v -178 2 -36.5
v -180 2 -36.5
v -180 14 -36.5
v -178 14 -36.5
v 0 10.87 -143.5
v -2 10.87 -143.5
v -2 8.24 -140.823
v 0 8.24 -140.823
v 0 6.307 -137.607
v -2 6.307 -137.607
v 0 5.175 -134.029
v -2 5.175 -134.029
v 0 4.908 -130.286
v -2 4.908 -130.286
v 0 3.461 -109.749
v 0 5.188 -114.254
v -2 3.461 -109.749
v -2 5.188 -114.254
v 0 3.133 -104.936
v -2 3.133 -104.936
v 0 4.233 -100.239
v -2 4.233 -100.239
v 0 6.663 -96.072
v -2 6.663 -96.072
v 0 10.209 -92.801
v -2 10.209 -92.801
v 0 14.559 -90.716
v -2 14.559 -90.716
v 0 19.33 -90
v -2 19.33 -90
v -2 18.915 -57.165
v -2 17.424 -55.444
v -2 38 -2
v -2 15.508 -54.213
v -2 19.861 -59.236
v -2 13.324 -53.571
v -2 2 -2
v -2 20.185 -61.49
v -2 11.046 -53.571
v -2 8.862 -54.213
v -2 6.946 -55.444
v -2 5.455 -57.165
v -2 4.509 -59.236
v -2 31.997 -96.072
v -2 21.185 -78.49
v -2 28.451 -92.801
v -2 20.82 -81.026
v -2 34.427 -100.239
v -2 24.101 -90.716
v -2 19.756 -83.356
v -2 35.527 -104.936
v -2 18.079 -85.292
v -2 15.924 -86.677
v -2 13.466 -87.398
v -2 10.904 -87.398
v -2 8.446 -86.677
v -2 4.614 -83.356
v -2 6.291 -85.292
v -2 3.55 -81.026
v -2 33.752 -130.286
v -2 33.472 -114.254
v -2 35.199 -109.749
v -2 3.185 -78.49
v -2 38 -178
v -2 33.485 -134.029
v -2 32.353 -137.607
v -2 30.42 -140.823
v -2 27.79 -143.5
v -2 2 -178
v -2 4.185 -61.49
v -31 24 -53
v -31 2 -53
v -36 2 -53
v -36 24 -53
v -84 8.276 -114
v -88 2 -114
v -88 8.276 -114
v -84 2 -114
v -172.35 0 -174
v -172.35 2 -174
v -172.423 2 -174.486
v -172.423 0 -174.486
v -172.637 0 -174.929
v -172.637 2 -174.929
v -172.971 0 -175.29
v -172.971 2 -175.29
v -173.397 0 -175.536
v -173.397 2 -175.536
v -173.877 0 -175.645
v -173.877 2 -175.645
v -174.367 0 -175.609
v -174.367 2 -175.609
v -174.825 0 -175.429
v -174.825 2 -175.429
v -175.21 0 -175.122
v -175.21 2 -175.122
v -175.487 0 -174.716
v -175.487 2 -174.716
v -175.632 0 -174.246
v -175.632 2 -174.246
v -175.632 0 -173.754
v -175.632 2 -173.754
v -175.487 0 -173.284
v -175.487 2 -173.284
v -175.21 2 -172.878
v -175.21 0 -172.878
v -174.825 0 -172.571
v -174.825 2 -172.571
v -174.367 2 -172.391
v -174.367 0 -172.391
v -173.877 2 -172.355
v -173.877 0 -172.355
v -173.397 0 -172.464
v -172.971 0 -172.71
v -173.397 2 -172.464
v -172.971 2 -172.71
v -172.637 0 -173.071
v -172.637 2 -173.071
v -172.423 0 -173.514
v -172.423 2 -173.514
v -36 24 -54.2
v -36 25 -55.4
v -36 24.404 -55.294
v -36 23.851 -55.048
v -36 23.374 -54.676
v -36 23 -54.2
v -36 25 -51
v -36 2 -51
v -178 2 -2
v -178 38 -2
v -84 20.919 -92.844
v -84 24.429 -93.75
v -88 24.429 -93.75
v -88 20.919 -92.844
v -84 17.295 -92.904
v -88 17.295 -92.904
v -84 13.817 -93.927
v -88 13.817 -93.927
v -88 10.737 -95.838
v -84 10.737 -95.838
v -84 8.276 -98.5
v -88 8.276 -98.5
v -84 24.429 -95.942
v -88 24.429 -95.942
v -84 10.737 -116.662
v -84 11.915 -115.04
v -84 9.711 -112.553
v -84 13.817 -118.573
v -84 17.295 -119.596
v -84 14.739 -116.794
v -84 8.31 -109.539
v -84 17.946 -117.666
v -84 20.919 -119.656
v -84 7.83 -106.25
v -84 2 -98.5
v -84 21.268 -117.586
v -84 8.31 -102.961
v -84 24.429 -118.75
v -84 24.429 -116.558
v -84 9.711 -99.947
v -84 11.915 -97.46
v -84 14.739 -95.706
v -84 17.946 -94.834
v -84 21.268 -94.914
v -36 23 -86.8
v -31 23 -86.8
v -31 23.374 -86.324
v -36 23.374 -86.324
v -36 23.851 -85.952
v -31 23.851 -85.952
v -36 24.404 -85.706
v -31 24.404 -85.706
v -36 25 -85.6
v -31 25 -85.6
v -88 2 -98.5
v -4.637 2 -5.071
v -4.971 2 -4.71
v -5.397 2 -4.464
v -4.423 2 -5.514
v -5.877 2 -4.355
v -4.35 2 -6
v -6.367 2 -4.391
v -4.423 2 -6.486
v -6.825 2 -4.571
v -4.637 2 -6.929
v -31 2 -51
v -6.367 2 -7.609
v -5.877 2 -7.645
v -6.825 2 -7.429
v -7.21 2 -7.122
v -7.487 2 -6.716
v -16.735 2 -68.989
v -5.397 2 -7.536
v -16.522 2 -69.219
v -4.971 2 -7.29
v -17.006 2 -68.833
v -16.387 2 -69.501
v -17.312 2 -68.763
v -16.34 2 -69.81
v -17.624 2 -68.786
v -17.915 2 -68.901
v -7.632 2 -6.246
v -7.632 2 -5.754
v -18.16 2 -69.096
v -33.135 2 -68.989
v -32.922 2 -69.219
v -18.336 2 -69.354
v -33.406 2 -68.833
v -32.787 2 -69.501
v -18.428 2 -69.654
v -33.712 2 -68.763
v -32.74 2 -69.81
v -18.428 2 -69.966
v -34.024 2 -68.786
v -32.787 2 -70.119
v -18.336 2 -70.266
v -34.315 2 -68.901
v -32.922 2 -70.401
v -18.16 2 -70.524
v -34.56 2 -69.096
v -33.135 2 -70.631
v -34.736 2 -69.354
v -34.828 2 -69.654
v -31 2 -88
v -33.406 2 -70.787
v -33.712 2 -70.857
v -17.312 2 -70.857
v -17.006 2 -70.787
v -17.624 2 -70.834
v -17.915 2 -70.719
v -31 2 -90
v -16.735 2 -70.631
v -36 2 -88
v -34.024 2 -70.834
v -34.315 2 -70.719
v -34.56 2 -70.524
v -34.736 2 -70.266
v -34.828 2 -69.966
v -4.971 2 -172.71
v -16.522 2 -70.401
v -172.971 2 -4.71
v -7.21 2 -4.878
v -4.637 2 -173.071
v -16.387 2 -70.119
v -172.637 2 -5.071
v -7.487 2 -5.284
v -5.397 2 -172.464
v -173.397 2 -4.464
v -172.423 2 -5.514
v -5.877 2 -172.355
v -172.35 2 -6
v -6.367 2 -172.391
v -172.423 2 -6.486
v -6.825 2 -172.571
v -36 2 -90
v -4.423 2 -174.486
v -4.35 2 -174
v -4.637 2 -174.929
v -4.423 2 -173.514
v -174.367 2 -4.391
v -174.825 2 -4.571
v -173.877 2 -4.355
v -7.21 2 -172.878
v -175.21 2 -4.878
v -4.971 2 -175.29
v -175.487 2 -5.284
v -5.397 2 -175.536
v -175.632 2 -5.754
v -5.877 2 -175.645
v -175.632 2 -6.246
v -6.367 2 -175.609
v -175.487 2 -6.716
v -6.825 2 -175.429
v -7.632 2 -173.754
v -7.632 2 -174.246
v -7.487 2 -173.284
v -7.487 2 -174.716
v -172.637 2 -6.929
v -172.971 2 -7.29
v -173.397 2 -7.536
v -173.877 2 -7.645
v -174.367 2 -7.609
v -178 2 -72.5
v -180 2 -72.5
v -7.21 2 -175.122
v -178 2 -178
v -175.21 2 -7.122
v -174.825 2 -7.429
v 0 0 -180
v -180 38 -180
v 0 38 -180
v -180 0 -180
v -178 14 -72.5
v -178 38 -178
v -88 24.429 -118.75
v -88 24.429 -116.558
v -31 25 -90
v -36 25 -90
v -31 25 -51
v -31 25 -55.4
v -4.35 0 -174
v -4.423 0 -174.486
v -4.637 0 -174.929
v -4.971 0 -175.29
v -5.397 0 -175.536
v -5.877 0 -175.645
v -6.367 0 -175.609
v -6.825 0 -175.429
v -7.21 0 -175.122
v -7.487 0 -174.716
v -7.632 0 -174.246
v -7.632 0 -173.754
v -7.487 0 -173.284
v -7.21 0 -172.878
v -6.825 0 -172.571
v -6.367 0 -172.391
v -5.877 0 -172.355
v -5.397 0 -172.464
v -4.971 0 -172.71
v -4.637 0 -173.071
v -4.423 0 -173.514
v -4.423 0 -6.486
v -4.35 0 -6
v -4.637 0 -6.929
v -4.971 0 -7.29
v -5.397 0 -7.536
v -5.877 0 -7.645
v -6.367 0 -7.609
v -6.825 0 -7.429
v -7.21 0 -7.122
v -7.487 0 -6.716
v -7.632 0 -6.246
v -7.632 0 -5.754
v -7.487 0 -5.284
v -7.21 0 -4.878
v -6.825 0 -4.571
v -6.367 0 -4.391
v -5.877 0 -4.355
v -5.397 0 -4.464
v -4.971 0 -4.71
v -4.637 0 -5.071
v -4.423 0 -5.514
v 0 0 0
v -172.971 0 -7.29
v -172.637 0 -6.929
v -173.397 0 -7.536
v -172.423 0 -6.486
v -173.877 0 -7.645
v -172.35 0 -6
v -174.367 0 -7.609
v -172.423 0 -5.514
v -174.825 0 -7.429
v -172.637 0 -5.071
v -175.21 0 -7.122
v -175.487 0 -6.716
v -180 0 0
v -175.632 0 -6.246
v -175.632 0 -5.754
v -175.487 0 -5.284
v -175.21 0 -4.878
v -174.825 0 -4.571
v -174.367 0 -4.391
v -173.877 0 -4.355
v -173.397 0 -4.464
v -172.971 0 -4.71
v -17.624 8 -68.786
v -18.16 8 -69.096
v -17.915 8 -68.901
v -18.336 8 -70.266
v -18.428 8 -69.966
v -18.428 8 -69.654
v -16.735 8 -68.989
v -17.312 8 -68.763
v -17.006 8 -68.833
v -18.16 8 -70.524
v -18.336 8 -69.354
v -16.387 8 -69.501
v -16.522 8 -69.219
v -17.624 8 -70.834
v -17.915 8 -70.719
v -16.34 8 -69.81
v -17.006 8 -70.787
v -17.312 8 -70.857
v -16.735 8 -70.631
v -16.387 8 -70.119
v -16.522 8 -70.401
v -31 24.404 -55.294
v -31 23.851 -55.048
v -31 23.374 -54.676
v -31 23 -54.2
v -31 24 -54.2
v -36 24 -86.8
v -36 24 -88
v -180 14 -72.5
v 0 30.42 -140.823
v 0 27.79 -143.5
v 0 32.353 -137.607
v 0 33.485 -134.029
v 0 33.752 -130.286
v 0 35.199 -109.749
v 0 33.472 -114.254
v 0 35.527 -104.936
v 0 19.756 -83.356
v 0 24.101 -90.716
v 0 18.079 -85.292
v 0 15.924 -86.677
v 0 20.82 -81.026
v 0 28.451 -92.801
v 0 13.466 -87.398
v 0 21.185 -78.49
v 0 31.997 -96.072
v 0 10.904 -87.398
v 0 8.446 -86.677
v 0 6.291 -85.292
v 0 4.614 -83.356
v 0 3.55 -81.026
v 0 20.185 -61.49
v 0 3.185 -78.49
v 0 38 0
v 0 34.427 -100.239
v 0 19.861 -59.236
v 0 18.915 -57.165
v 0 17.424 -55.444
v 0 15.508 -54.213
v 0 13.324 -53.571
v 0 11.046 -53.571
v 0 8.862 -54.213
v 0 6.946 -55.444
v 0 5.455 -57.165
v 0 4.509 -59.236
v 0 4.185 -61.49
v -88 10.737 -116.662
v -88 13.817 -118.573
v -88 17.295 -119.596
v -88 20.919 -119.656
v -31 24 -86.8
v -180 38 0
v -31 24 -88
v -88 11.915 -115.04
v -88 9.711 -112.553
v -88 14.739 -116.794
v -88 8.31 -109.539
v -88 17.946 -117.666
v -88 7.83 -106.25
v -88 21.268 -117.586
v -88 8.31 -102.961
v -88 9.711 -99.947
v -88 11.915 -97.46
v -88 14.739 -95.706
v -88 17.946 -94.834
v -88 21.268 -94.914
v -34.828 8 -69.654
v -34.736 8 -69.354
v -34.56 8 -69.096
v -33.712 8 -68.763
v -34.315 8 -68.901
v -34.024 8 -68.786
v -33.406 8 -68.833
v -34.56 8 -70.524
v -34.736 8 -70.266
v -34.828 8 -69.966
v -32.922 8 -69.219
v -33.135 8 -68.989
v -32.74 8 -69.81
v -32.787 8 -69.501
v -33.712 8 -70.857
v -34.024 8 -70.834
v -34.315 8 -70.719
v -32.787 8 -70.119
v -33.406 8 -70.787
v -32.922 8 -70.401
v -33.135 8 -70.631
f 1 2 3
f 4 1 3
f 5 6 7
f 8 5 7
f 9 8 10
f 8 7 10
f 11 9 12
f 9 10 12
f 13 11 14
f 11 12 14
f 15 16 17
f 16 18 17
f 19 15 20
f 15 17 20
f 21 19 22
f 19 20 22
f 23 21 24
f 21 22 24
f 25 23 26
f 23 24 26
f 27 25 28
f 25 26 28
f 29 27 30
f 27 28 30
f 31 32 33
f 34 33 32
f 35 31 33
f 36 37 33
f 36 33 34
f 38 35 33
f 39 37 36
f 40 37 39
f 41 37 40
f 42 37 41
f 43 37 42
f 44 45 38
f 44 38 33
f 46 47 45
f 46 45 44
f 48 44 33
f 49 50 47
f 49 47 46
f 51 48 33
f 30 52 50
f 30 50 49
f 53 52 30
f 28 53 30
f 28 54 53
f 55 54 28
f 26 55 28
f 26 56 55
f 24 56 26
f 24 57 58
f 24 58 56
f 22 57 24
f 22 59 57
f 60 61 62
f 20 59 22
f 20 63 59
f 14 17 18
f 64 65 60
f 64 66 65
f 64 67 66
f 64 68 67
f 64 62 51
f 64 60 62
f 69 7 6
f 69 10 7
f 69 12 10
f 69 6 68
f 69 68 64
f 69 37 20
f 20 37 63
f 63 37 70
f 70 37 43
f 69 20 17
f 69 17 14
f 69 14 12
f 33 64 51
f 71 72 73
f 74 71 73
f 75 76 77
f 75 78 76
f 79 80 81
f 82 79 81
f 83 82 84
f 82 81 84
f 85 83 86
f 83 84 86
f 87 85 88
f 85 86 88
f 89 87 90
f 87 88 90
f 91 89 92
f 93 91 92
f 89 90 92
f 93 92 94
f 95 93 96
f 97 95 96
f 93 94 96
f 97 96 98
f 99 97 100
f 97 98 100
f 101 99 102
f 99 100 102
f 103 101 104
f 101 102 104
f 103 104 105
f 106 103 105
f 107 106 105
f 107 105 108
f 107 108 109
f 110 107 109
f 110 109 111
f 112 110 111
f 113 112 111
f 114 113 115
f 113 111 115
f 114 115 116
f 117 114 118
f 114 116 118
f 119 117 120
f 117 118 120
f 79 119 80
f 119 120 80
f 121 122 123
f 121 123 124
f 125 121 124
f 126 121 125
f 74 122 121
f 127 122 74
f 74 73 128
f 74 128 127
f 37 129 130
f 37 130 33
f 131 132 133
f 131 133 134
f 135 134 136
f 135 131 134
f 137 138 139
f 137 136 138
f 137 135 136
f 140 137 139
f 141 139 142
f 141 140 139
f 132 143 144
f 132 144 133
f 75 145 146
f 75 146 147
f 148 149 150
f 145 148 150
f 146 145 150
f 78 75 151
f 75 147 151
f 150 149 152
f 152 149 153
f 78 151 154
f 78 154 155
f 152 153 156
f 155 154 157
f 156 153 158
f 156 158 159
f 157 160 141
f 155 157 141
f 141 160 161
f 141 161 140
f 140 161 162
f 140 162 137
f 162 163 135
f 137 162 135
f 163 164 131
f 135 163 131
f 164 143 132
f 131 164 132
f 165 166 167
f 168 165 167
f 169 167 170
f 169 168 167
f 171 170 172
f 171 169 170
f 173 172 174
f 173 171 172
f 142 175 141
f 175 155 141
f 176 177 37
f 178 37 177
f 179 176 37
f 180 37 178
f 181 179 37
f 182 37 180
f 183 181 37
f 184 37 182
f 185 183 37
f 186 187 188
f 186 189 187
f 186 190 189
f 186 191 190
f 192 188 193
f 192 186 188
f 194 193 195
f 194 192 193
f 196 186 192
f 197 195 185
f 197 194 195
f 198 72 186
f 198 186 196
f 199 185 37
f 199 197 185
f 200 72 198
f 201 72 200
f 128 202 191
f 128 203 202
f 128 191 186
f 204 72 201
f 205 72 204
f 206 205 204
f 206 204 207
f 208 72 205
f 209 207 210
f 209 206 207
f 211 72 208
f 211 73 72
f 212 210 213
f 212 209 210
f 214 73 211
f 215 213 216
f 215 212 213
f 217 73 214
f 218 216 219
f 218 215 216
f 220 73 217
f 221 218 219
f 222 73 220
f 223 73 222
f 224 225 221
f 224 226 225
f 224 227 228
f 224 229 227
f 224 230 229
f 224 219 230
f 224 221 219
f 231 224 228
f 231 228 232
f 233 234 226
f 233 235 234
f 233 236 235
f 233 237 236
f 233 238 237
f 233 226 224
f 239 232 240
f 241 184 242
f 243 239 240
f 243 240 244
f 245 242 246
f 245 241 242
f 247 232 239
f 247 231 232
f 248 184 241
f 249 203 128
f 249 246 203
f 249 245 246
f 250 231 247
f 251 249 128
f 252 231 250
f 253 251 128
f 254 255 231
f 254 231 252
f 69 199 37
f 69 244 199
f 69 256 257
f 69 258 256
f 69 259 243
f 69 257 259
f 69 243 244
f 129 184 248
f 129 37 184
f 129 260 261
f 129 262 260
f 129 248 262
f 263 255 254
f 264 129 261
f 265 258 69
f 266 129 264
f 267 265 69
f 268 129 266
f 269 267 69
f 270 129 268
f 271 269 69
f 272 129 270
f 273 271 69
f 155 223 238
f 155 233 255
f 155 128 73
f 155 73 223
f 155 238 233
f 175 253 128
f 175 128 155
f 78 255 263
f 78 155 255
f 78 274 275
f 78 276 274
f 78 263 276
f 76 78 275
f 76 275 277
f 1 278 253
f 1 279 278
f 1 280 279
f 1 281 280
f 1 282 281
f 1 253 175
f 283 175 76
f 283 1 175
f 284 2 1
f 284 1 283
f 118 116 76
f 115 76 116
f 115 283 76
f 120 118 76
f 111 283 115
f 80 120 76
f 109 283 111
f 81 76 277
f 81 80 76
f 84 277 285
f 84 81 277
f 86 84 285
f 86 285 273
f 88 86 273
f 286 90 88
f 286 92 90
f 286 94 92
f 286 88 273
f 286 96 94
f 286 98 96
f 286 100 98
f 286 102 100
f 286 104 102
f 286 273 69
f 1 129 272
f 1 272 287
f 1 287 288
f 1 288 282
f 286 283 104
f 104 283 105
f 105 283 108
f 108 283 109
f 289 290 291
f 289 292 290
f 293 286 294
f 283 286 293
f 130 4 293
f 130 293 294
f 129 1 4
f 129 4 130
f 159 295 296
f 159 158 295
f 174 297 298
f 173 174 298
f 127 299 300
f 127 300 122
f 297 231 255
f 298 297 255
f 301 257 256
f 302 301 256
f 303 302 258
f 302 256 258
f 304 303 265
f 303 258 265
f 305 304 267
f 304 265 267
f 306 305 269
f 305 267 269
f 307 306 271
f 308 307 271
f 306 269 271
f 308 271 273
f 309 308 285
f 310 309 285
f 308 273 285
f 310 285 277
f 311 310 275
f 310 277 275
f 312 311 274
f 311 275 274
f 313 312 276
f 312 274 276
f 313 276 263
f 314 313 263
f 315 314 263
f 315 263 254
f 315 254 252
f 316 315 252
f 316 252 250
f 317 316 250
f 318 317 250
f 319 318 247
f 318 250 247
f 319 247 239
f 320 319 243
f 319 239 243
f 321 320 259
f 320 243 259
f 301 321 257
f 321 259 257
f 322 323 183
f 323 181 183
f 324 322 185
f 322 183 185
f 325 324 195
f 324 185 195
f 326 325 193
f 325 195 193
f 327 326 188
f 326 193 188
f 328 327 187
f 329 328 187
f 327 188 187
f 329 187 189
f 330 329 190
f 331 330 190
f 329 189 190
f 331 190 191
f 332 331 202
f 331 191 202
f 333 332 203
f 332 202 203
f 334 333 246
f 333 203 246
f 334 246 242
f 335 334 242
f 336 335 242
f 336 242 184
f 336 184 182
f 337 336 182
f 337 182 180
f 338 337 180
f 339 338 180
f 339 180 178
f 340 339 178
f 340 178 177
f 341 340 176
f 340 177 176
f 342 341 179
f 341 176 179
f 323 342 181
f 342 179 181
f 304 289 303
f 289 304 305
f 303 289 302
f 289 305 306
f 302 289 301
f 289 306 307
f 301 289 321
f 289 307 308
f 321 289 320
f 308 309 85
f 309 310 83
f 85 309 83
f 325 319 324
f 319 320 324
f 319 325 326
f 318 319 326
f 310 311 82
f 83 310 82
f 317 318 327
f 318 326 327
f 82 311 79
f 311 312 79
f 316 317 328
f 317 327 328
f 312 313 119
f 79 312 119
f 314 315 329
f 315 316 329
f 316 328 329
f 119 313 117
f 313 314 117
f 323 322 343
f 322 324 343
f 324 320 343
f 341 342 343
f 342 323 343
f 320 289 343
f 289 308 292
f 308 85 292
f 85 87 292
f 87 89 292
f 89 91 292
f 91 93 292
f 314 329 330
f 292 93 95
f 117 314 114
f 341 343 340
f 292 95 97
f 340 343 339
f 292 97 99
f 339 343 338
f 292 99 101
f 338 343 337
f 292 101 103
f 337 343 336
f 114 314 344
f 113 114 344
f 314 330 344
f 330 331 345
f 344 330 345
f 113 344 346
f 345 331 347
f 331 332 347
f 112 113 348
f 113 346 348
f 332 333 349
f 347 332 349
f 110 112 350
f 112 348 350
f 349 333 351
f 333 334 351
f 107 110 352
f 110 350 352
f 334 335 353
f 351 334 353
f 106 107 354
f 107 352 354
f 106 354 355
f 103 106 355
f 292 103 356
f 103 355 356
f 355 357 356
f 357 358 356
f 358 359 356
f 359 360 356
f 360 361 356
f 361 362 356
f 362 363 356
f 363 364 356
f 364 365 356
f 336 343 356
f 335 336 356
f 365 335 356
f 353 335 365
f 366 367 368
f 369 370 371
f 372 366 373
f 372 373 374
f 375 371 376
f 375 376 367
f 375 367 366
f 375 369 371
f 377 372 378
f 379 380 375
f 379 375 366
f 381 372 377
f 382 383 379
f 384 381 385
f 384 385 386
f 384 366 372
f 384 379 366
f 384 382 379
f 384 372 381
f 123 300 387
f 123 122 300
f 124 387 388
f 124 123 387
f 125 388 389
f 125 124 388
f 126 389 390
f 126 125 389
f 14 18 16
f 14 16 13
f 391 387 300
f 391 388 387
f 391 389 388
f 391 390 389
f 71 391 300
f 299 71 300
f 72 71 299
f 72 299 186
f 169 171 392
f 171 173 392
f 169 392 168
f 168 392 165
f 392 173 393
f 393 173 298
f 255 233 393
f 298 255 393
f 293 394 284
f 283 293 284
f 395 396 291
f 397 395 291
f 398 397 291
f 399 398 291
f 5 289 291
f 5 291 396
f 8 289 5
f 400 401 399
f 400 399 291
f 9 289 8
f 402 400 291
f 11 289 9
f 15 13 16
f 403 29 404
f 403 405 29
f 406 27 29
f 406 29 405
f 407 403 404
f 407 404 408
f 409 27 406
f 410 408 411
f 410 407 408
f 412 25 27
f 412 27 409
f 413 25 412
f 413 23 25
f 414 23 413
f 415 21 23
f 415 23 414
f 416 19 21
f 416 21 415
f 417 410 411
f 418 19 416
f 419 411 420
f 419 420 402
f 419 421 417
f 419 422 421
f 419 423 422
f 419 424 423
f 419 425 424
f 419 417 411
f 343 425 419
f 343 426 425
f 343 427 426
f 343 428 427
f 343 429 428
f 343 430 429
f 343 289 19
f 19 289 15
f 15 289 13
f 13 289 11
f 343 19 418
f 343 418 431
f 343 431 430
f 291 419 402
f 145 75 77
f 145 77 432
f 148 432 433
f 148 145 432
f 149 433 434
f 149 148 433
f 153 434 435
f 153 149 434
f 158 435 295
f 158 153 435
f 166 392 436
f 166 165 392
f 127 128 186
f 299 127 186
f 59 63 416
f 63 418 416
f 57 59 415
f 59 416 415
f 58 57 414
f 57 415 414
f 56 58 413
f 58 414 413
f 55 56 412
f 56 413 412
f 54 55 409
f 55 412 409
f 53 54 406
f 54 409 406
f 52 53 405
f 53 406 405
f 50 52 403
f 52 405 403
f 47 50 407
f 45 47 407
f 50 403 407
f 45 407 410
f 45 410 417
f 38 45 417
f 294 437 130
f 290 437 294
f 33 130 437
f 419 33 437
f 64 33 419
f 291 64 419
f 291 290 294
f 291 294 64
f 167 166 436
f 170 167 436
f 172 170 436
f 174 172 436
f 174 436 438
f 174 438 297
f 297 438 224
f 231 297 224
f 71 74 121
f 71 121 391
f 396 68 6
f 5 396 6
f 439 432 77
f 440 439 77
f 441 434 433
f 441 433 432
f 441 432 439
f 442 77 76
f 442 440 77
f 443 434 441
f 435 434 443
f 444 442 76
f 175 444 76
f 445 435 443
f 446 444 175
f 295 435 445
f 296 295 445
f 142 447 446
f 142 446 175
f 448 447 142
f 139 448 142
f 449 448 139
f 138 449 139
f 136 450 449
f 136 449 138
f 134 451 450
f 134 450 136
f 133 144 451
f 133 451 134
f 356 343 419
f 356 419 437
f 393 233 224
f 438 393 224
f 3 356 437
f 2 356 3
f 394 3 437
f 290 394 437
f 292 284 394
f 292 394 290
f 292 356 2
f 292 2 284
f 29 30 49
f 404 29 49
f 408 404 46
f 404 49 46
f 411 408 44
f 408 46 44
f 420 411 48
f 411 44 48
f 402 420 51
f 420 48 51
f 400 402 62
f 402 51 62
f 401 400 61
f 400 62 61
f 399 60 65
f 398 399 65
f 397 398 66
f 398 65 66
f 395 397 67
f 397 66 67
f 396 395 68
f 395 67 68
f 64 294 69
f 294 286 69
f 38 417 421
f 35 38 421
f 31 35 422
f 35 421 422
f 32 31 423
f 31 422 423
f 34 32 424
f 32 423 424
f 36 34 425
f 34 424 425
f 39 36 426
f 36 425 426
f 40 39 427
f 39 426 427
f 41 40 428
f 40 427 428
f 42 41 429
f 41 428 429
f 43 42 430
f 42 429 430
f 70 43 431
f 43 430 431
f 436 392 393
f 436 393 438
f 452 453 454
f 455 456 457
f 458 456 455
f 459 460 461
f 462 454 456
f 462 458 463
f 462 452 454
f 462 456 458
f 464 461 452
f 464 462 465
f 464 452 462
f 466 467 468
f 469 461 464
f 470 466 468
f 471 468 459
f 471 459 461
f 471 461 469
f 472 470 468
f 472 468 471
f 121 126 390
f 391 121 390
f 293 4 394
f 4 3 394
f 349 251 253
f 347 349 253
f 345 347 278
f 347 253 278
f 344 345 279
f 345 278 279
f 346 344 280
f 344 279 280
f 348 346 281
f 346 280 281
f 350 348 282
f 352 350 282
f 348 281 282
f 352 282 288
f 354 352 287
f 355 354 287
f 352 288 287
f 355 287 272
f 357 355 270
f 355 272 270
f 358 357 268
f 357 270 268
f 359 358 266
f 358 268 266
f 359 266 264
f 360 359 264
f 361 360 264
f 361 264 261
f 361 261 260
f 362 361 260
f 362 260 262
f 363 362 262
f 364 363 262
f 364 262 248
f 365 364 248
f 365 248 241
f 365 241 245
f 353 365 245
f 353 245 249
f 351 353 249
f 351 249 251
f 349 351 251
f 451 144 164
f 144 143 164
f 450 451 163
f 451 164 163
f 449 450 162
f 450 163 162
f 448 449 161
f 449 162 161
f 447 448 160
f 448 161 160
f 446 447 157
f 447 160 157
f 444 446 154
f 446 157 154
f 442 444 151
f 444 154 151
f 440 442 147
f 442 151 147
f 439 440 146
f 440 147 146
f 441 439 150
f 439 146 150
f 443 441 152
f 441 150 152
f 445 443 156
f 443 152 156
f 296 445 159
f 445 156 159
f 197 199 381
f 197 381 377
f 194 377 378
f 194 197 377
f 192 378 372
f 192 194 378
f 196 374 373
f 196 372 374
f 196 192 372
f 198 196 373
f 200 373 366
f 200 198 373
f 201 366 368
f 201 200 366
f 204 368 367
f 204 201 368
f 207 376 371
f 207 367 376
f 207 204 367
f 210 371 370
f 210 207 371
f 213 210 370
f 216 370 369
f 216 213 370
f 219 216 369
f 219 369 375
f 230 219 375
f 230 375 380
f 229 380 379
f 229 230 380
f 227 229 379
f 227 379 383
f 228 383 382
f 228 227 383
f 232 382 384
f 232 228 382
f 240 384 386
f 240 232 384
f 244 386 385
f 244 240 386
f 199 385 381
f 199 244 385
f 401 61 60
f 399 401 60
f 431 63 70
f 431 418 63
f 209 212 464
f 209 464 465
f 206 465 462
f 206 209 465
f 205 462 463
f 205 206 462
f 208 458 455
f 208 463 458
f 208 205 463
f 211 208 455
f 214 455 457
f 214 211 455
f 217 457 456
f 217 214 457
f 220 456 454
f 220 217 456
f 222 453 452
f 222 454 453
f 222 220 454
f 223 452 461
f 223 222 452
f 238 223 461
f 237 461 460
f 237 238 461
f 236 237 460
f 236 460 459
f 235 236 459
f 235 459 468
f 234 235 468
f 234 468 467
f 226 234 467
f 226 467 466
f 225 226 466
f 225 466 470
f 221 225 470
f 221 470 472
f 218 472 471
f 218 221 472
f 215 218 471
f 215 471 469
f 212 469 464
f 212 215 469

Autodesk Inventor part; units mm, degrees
ref_plane "YZ Plane" through (0, 0, 0) normal (1, 0, 0) x (0, 1, 0)
ref_plane "XZ Plane" through (0, 0, 0) normal (0, 1, 0) x (-1, 0, 0)
sketch "Sketch1" plane through (0, 0, 0) normal (0, 1, 0) x (-1, 0, 0)
  line L0 (0, 0) -> (180, 0)
  line L1 (180, 0) -> (180, -180)
  line L2 (180, -180) -> (0, -180)
  line L3 (0, -180) -> (0, 0)
  dimension "d0" = 180
  dimension "d1" = 180
extrude "Extrusion1" add sketch "Sketch1" along normal blind 2
sketch "Sketch4" plane through (0, 2, 0) normal (0, 1, 0) x (1, 0, 0)
  line L0 (0, 180) -> (-180, 180) projected
  line L1 (-180, 180) -> (-180, 0) projected
  line L2 (0, 180) -> (-180, 180)
  line L3 (-180, 180) -> (-180, 178)
  line L4 (-180, 178) -> (0, 178)
  line L5 (0, 178) -> (0, 180)
  line L6 (-180, 0) -> (0, 0) projected
  line L7 (0, 0) -> (-180, 0)
  line L8 (-180, 0) -> (-180, 2)
  line L9 (-180, 2) -> (0, 2)
  line L10 (0, 2) -> (0, 0)
  line L11 (0, 2) -> (-2, 2)
  line L12 (-2, 2) -> (-2, 178)
  line L13 (-2, 178) -> (0, 178)
  line L14 (0, 178) -> (0, 2)
  line L15 (-180, 178) -> (-178, 178)
  line L16 (-178, 178) -> (-178, 2)
  line L17 (-178, 2) -> (-180, 2)
  line L18 (-180, 2) -> (-180, 178)
  dimension "d16" = 2
  dimension "d17" = 2
  dimension "d18" = 2
  dimension "d19" = 2
extrude "Extrusion4" add sketch "Sketch4" along normal blind 36 contours L5 L4 L1 L0 | L14 L9 L12 L4 | L4 L16 L9 L1 | L10 L6 L1 L9
sketch "Sketch5" plane through (0, 2, 0) normal (0, 1, 0) x (1, 0, 0)
  circle A0 centre (-174, 6) radius 1.65
  circle A1 centre (-174, 174) radius 1.65
  circle A2 centre (-6, 174) radius 1.65
  circle A3 centre (-6, 6) radius 1.65
  point P0 (0, 0)
  dimension "d22" = 3.3
  dimension "d23" = 3.3
  dimension "d24" = 3.3
  dimension "d25" = 3.3
extrude "Extrusion5" cut sketch "Sketch5" against normal through all
sketch "Sketch8" plane through (-180, 0, -180) normal (-1, 0, 0) x (0, 0, 1)
  line L0 (178, 2) -> (2, 2) projected
  line L1 (143.5, 14) -> (107.5, 14)
  line L2 (107.5, 14) -> (107.5, 2)
  line L3 (107.5, 2) -> (143.5, 2)
  line L4 (143.5, 2) -> (143.5, 14)
  line L5 (178, 2) -> (178, 38) projected
  point P0 (180, 0)
  point P1 (143.5, 2)
  point P2 (107.5, 2)
  dimension "d84" = 36
  dimension "d101" = 12
  dimension "d108" = 34.5
extrude "Extrusion10" cut sketch "Sketch8" against normal blind 10
sketch "Sketch15" plane through (-2, 2, -2) normal (-1, 0, 0) x (0, 0, 1)
  line L0 (-141.5, 17.33) -> (-133.04, 17.33) construction
  line L1 (-112.2541, 3.188) -> (-128.2862, 2.9082)
  arc A0 (-141.5, 8.8698) -> (-128.2862, 2.9082) centre (-129.027, 18.891) ccw
  arc A1 (-112.2541, 3.188) -> (-88, 17.33) centre (-104.25, 17.33) ccw
  line L2 (-112.2541, 31.472) -> (-128.2862, 31.7518)
  arc A2 (-128.2862, 31.7518) -> (-141.5, 25.7902) centre (-129.027, 15.769) ccw
  arc A3 (-88, 17.33) -> (-112.2541, 31.472) centre (-104.25, 17.33) ccw
  line L3 (-141.5, 17.33) -> (-141.5, 8.8698)
  line L4 (-141.5, 17.33) -> (-141.5, 25.7902)
  line L5 (-176, 36) -> (0, 36) projected
  line L6 (0, 0) -> (-176, 0) projected
  point P0 (2, -2)
extrude "Extrusion17" cut sketch "Sketch15" against normal through all
ref_plane "Work Plane1" through (-84, 2, -178) normal (-1, 0, 0) x (0, 0, 1)
sketch "Sketch16" plane through (-84, 2, -178) normal (-1, 0, 0) x (0, 0, 1)
  arc A0 (63.7459, 3.188) -> (63.7459, 31.472) centre (71.75, 17.33) ccw projected
  line L0 (176, 0) -> (0, 0) projected
  line L1 (71.75, 0) -> (79.5, 0)
  line L2 (-2, -2) -> (178, -2) projected
  line L3 (45.25, 0) -> (53, 0) construction
  line L4 (79.5, 0) -> (79.5, 6.2762)
  line L5 (71.75, 0) -> (64, 0)
  line L6 (45.25, 0) -> (53, 0) construction
  line L7 (64, 0) -> (64, 6.2762)
  arc A1 (61.4422, 22.429) -> (82.0578, 22.429) centre (71.75, 17.33) ccw
  line L8 (59.25, 22.429) -> (61.4422, 22.429)
  line L9 (82.0578, 22.429) -> (84.25, 22.429)
  arc A2 (59.25, 22.429) -> (64, 6.2762) centre (71.75, 17.33) ccw
  arc A3 (79.5, 6.2762) -> (84.25, 22.429) centre (71.75, 17.33) ccw
  dimension "d135" = 23
extrude "Extrusion18" add sketch "Sketch16" along normal blind 4
sketch "Sketch17" plane through (0, 0, 0) normal (1, 0, 0) x (0, 0, -1)
  line L0 (36.5, 2) -> (2, 2) projected
  line L1 (53, 2) -> (88, 2)
  line L2 (88, 2) -> (88, 23.37)
  line L3 (88, 23.37) -> (53, 23.37)
  line L4 (53, 23.37) -> (53, 2)
  line L5 (0, 0) -> (0, 38) projected
  arc A0 (61.49, 20.185) -> (61.49, 4.185) centre (61.49, 12.185) ccw
  arc A1 (77.4348, 3.2471) -> (77.4348, 21.1229) centre (78.49, 12.185) ccw
  line L6 (78.49, 3.185) -> (61.49, 4.185)
  line L7 (78.49, 21.185) -> (61.49, 20.185)
  dimension "d144" = 35
  dimension "d145" = 21.37
  dimension "d147" = 16
  dimension "d148" = 18
extrude "Extrusion19" cut sketch "Sketch17" against normal blind 10 contours L7 A1 L6 A0
sketch "Sketch21" plane through (0, 2, 0) normal (0, 1, 0) x (1, 0, 0)
  circle A0 centre (-17.39, 69.81) radius 1.05
  circle A1 centre (-33.79, 69.81) radius 1.05
  point P0 (0, 0)
  dimension "d155" = 2.1
  dimension "d156" = 2.1
extrude "Extrusion21" add sketch "Sketch21" along normal blind 6
sketch "Sketch22" plane through (0, 2, 0) normal (0, 1, 0) x (1, 0, 0)
  line L0 (-36, 88) -> (-31, 88)
  line L1 (-31, 88) -> (-31, 90)
  line L2 (-31, 90) -> (-36, 90)
  line L3 (-36, 90) -> (-36, 88)
  line L4 (-31, 53) -> (-36, 53)
  line L5 (-36, 53) -> (-36, 51)
  line L6 (-36, 51) -> (-31, 51)
  line L7 (-31, 51) -> (-31, 53)
  line L8 (-2, 2) -> (-2, 178) projected
  line L9 (-2, 90) -> (-178, 90) construction
  line L10 (-178, 178) -> (-178, 72.5) projected
  point P0 (0, 0)
  dimension "d159" = 5
  dimension "d160" = 2
  dimension "d161" = 5
  dimension "d162" = 2
extrude "Extrusion22" add sketch "Sketch22" along normal blind 23
sketch "Sketch23" plane through (-36, 2, -88) normal (0, 0, 1) x (1, 0, 0)
  line L0 (5, 0) -> (5, 23) projected
  line L1 (5, 23) -> (0, 23)
  line L2 (0, 23) -> (0, 21)
  line L3 (0, 21) -> (5, 21)
  line L4 (5, 21) -> (5, 23)
  point P0 (36, -2)
  dimension "d165" = 5
  dimension "d166" = 2
sketch "Sketch24" plane through (-31, 2, -53) normal (0, 0, -1) x (-1, 0, 0)
  line L0 (0, 23) -> (5, 23)
  line L1 (5, 23) -> (5, 21)
  line L2 (5, 21) -> (0, 21)
  line L3 (0, 21) -> (0, 23)
  point P0 (-31, -2)
  dimension "d167" = 5
  dimension "d168" = 2
extrude "Extrusion23" add sketch "Sketch23" along normal blind 2.4
extrude "Extrusion24" add sketch "Sketch24" along normal blind 2.4
sketch "Sketch25" plane through (-36, 23, -88) normal (0, -1, 0) x (1, 0, 0)
  line L0 (5, 0) -> (0, 0)
  line L1 (0, 0) -> (0, 1.2)
  line L2 (0, 1.2) -> (5, 1.2)
  line L3 (5, 1.2) -> (5, 0)
  point P0 (36, 88)
  dimension "d173" = 5
  dimension "d174" = 1.2
sketch "Sketch26" plane through (-36, 23, -53) normal (0, -1, 0) x (1, 0, 0)
  line L0 (5, 0) -> (0, 0)
  line L1 (0, 0) -> (0, -1.2)
  line L2 (0, -1.2) -> (5, -1.2)
  line L3 (5, -1.2) -> (5, 0)
  point P0 (36, 53)
  dimension "d175" = 5
  dimension "d176" = 1.2
extrude "Extrusion25" cut sketch "Sketch26" against normal blind 1
extrude "Extrusion26" cut sketch "Sketch25" against normal blind 1
fillet "Fillet1" radius 2.5 2 edges at (-33.5, 23, -85.6) (-33.5, 23, -55.4)
properties part number "base plate"
